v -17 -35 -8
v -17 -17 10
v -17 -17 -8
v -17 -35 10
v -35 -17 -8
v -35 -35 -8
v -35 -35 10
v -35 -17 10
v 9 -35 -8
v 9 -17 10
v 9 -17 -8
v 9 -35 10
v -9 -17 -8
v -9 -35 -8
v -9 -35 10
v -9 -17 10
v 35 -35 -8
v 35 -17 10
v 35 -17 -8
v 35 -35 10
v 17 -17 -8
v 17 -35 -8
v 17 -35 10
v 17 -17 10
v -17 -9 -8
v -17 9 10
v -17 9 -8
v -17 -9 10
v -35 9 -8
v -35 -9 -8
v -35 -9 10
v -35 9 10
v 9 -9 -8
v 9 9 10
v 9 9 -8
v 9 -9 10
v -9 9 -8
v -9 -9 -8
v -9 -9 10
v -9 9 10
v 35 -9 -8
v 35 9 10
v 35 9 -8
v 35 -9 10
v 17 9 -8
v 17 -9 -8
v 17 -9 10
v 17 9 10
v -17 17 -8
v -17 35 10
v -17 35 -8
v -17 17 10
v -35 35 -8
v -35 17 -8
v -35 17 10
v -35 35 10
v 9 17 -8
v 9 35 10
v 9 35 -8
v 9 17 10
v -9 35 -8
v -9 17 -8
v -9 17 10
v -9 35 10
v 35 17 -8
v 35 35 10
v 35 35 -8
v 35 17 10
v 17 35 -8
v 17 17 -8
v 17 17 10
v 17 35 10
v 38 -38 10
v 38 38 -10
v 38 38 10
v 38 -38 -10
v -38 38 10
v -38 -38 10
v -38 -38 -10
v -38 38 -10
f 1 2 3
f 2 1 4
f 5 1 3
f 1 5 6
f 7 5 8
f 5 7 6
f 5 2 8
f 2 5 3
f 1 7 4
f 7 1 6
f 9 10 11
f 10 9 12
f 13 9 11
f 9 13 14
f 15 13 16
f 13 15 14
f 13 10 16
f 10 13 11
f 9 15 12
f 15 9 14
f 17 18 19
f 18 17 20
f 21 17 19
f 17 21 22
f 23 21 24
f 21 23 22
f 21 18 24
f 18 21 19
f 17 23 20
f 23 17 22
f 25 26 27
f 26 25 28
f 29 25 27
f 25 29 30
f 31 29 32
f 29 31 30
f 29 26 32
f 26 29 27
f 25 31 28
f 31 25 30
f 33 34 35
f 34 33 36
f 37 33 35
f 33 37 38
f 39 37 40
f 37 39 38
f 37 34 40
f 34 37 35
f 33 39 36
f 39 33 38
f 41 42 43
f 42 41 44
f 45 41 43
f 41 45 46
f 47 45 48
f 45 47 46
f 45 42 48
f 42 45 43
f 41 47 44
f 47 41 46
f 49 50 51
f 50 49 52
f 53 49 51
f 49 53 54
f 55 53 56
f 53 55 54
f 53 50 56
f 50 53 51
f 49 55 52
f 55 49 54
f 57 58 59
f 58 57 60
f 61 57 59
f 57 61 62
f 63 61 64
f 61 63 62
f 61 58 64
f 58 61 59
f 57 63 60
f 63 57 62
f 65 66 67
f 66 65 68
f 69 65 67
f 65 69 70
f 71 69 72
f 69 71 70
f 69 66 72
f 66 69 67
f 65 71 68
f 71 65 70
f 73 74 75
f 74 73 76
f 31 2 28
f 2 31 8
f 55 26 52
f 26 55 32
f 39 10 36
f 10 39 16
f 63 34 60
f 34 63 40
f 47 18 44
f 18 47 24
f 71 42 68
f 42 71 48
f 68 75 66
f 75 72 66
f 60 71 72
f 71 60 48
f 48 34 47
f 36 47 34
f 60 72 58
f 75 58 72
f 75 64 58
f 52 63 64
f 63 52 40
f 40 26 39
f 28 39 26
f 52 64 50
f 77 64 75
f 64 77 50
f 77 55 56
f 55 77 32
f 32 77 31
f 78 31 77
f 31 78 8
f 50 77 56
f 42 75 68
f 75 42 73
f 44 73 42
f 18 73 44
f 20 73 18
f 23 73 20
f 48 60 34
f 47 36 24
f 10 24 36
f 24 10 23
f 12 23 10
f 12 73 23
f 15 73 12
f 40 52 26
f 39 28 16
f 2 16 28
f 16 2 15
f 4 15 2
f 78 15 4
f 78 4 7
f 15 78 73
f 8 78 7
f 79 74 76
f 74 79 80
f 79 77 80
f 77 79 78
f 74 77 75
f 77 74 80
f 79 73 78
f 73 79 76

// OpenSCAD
$fn = 32;

// ----------------------------------------------------------------------
// Pocket plate 76 x 76 x 20
// 3 x 3 pockets 18 mm square, 18 mm deep
// ----------------------------------------------------------------------

// --- parameters (mm) ---
thickness = 20;  // plate thickness
floor_t = 2;     // material left under each pocket
pocket = 18;     // pocket side length
pitch_x = 26;    // pocket pitch along X
pitch_y = 26;    // pocket pitch along Y
cols = 3;        // pockets per row
rows = 3;        // rows of pockets

// --- derived feature positions (mm) ---
depth = thickness - floor_t;        // = 18   pocket depth, down to the floor
span_x = (cols - 1) * pitch_x;      // = 52   distance between outer pockets
span_y = (rows - 1) * pitch_y;      // = 52   distance between outer pocket rows
origin_x = -span_x / 2;             // = -26   X of the first pocket
origin_y = -span_y / 2;             // = -26   Y of the first pocket
plate = [span_x + pocket + 6, span_y + pocket + 6, thickness];  // = [76, 76, 20]   overall size: pockets plus 3 mm of wall on each side
feature_centers = [
  [origin_x + 0 * pitch_x, origin_y + 0 * pitch_y],
  [origin_x + 1 * pitch_x, origin_y + 0 * pitch_y],
  [origin_x + 2 * pitch_x, origin_y + 0 * pitch_y],
  [origin_x + 0 * pitch_x, origin_y + 1 * pitch_y],
  [origin_x + 1 * pitch_x, origin_y + 1 * pitch_y],
  [origin_x + 2 * pitch_x, origin_y + 1 * pitch_y],
  [origin_x + 0 * pitch_x, origin_y + 2 * pitch_y],
  [origin_x + 1 * pitch_x, origin_y + 2 * pitch_y],
  [origin_x + 2 * pitch_x, origin_y + 2 * pitch_y]
];   // pocket centres, used verbatim by the cutter loop

// plate outline, then one pocket per centre in feature_centers
difference() {
  cube(plate, center = true);
  for (centre = feature_centers)
    translate([centre[0] - pocket / 2, centre[1] - pocket / 2, plate[2] / 2 - depth])
      cube([pocket, pocket, depth + 1]);  // centred on the declared pocket centre
}
